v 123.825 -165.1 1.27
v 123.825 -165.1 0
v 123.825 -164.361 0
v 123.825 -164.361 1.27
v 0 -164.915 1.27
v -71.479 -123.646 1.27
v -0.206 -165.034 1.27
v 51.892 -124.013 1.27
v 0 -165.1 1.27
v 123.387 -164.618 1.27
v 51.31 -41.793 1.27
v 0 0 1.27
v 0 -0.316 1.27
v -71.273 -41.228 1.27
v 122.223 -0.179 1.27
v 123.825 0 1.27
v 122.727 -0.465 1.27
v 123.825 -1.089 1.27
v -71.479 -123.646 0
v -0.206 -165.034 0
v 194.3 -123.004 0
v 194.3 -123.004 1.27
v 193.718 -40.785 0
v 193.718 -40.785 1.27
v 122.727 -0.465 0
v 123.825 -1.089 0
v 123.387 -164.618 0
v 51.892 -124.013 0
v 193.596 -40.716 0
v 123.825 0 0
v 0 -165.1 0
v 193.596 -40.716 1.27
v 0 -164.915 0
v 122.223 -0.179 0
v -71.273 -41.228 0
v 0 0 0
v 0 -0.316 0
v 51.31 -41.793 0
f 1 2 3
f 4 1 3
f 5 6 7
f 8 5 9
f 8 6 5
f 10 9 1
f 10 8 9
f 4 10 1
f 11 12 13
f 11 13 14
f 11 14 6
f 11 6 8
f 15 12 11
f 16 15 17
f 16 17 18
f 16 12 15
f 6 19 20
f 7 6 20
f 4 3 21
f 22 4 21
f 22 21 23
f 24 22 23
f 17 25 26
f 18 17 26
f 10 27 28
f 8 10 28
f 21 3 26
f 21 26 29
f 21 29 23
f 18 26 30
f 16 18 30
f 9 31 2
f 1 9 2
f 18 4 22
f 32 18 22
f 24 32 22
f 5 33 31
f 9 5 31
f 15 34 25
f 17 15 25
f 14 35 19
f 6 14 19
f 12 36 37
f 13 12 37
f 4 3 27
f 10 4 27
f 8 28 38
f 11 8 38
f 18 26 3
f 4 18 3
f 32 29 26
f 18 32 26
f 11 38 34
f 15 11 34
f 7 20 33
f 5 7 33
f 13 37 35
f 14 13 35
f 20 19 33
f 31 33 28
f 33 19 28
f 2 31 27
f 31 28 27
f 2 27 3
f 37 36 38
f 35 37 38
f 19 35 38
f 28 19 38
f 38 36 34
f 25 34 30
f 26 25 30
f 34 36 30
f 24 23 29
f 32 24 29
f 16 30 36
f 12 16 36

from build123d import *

# Parameters (mm, degrees)
F2_DEPTH = 1.27
F6_DEPTH = 1.27
F8_DEPTH = 1.27


with BuildPart() as f2:
    # F1 (on face) → F2 (new body)
    with BuildSketch(Plane.XY):
        Polygon((0, -0.3162004163), (-71.2728396538, -41.2281905004), (-71.4790315396, -123.6460217613), (-0.2061918858, -165.0335048029), (0, -164.9151466677), align=None)
    extrude(amount=F2_DEPTH)

    # F4 (on face) → F6 (join)
    with BuildSketch(Plane.XY):
        Polygon((51.3098860629, -41.7930965099), (122.2228978995, -0.1791509228), (122.7269796824, -0.4654425877), (122.7269796824, 0), (0, 0), (0, -165.1), (123.825, -165.1), (123.825, -164.361211811), (123.3873541232, -164.6180359287), (51.8921141747, -124.0125390129), align=None)
        Polygon((122.7269796824, 0), (122.7269796824, -0.4654425877), (123.825, -1.0890597775), (123.825, 0), align=None)
    extrude(amount=F6_DEPTH)


with BuildPart() as f8:
    # F7 (on face) → F8 (new body)
    with BuildSketch(Plane.XY):
        Polygon((123.825, -164.361211811), (194.3003659599, -123.0040903416), (193.718137848, -40.7846478386), (193.5964673758, -40.7155454761), (123.825, -1.0890597775), align=None)
    extrude(amount=F8_DEPTH)


solid = Compound([f2.part, f8.part])
